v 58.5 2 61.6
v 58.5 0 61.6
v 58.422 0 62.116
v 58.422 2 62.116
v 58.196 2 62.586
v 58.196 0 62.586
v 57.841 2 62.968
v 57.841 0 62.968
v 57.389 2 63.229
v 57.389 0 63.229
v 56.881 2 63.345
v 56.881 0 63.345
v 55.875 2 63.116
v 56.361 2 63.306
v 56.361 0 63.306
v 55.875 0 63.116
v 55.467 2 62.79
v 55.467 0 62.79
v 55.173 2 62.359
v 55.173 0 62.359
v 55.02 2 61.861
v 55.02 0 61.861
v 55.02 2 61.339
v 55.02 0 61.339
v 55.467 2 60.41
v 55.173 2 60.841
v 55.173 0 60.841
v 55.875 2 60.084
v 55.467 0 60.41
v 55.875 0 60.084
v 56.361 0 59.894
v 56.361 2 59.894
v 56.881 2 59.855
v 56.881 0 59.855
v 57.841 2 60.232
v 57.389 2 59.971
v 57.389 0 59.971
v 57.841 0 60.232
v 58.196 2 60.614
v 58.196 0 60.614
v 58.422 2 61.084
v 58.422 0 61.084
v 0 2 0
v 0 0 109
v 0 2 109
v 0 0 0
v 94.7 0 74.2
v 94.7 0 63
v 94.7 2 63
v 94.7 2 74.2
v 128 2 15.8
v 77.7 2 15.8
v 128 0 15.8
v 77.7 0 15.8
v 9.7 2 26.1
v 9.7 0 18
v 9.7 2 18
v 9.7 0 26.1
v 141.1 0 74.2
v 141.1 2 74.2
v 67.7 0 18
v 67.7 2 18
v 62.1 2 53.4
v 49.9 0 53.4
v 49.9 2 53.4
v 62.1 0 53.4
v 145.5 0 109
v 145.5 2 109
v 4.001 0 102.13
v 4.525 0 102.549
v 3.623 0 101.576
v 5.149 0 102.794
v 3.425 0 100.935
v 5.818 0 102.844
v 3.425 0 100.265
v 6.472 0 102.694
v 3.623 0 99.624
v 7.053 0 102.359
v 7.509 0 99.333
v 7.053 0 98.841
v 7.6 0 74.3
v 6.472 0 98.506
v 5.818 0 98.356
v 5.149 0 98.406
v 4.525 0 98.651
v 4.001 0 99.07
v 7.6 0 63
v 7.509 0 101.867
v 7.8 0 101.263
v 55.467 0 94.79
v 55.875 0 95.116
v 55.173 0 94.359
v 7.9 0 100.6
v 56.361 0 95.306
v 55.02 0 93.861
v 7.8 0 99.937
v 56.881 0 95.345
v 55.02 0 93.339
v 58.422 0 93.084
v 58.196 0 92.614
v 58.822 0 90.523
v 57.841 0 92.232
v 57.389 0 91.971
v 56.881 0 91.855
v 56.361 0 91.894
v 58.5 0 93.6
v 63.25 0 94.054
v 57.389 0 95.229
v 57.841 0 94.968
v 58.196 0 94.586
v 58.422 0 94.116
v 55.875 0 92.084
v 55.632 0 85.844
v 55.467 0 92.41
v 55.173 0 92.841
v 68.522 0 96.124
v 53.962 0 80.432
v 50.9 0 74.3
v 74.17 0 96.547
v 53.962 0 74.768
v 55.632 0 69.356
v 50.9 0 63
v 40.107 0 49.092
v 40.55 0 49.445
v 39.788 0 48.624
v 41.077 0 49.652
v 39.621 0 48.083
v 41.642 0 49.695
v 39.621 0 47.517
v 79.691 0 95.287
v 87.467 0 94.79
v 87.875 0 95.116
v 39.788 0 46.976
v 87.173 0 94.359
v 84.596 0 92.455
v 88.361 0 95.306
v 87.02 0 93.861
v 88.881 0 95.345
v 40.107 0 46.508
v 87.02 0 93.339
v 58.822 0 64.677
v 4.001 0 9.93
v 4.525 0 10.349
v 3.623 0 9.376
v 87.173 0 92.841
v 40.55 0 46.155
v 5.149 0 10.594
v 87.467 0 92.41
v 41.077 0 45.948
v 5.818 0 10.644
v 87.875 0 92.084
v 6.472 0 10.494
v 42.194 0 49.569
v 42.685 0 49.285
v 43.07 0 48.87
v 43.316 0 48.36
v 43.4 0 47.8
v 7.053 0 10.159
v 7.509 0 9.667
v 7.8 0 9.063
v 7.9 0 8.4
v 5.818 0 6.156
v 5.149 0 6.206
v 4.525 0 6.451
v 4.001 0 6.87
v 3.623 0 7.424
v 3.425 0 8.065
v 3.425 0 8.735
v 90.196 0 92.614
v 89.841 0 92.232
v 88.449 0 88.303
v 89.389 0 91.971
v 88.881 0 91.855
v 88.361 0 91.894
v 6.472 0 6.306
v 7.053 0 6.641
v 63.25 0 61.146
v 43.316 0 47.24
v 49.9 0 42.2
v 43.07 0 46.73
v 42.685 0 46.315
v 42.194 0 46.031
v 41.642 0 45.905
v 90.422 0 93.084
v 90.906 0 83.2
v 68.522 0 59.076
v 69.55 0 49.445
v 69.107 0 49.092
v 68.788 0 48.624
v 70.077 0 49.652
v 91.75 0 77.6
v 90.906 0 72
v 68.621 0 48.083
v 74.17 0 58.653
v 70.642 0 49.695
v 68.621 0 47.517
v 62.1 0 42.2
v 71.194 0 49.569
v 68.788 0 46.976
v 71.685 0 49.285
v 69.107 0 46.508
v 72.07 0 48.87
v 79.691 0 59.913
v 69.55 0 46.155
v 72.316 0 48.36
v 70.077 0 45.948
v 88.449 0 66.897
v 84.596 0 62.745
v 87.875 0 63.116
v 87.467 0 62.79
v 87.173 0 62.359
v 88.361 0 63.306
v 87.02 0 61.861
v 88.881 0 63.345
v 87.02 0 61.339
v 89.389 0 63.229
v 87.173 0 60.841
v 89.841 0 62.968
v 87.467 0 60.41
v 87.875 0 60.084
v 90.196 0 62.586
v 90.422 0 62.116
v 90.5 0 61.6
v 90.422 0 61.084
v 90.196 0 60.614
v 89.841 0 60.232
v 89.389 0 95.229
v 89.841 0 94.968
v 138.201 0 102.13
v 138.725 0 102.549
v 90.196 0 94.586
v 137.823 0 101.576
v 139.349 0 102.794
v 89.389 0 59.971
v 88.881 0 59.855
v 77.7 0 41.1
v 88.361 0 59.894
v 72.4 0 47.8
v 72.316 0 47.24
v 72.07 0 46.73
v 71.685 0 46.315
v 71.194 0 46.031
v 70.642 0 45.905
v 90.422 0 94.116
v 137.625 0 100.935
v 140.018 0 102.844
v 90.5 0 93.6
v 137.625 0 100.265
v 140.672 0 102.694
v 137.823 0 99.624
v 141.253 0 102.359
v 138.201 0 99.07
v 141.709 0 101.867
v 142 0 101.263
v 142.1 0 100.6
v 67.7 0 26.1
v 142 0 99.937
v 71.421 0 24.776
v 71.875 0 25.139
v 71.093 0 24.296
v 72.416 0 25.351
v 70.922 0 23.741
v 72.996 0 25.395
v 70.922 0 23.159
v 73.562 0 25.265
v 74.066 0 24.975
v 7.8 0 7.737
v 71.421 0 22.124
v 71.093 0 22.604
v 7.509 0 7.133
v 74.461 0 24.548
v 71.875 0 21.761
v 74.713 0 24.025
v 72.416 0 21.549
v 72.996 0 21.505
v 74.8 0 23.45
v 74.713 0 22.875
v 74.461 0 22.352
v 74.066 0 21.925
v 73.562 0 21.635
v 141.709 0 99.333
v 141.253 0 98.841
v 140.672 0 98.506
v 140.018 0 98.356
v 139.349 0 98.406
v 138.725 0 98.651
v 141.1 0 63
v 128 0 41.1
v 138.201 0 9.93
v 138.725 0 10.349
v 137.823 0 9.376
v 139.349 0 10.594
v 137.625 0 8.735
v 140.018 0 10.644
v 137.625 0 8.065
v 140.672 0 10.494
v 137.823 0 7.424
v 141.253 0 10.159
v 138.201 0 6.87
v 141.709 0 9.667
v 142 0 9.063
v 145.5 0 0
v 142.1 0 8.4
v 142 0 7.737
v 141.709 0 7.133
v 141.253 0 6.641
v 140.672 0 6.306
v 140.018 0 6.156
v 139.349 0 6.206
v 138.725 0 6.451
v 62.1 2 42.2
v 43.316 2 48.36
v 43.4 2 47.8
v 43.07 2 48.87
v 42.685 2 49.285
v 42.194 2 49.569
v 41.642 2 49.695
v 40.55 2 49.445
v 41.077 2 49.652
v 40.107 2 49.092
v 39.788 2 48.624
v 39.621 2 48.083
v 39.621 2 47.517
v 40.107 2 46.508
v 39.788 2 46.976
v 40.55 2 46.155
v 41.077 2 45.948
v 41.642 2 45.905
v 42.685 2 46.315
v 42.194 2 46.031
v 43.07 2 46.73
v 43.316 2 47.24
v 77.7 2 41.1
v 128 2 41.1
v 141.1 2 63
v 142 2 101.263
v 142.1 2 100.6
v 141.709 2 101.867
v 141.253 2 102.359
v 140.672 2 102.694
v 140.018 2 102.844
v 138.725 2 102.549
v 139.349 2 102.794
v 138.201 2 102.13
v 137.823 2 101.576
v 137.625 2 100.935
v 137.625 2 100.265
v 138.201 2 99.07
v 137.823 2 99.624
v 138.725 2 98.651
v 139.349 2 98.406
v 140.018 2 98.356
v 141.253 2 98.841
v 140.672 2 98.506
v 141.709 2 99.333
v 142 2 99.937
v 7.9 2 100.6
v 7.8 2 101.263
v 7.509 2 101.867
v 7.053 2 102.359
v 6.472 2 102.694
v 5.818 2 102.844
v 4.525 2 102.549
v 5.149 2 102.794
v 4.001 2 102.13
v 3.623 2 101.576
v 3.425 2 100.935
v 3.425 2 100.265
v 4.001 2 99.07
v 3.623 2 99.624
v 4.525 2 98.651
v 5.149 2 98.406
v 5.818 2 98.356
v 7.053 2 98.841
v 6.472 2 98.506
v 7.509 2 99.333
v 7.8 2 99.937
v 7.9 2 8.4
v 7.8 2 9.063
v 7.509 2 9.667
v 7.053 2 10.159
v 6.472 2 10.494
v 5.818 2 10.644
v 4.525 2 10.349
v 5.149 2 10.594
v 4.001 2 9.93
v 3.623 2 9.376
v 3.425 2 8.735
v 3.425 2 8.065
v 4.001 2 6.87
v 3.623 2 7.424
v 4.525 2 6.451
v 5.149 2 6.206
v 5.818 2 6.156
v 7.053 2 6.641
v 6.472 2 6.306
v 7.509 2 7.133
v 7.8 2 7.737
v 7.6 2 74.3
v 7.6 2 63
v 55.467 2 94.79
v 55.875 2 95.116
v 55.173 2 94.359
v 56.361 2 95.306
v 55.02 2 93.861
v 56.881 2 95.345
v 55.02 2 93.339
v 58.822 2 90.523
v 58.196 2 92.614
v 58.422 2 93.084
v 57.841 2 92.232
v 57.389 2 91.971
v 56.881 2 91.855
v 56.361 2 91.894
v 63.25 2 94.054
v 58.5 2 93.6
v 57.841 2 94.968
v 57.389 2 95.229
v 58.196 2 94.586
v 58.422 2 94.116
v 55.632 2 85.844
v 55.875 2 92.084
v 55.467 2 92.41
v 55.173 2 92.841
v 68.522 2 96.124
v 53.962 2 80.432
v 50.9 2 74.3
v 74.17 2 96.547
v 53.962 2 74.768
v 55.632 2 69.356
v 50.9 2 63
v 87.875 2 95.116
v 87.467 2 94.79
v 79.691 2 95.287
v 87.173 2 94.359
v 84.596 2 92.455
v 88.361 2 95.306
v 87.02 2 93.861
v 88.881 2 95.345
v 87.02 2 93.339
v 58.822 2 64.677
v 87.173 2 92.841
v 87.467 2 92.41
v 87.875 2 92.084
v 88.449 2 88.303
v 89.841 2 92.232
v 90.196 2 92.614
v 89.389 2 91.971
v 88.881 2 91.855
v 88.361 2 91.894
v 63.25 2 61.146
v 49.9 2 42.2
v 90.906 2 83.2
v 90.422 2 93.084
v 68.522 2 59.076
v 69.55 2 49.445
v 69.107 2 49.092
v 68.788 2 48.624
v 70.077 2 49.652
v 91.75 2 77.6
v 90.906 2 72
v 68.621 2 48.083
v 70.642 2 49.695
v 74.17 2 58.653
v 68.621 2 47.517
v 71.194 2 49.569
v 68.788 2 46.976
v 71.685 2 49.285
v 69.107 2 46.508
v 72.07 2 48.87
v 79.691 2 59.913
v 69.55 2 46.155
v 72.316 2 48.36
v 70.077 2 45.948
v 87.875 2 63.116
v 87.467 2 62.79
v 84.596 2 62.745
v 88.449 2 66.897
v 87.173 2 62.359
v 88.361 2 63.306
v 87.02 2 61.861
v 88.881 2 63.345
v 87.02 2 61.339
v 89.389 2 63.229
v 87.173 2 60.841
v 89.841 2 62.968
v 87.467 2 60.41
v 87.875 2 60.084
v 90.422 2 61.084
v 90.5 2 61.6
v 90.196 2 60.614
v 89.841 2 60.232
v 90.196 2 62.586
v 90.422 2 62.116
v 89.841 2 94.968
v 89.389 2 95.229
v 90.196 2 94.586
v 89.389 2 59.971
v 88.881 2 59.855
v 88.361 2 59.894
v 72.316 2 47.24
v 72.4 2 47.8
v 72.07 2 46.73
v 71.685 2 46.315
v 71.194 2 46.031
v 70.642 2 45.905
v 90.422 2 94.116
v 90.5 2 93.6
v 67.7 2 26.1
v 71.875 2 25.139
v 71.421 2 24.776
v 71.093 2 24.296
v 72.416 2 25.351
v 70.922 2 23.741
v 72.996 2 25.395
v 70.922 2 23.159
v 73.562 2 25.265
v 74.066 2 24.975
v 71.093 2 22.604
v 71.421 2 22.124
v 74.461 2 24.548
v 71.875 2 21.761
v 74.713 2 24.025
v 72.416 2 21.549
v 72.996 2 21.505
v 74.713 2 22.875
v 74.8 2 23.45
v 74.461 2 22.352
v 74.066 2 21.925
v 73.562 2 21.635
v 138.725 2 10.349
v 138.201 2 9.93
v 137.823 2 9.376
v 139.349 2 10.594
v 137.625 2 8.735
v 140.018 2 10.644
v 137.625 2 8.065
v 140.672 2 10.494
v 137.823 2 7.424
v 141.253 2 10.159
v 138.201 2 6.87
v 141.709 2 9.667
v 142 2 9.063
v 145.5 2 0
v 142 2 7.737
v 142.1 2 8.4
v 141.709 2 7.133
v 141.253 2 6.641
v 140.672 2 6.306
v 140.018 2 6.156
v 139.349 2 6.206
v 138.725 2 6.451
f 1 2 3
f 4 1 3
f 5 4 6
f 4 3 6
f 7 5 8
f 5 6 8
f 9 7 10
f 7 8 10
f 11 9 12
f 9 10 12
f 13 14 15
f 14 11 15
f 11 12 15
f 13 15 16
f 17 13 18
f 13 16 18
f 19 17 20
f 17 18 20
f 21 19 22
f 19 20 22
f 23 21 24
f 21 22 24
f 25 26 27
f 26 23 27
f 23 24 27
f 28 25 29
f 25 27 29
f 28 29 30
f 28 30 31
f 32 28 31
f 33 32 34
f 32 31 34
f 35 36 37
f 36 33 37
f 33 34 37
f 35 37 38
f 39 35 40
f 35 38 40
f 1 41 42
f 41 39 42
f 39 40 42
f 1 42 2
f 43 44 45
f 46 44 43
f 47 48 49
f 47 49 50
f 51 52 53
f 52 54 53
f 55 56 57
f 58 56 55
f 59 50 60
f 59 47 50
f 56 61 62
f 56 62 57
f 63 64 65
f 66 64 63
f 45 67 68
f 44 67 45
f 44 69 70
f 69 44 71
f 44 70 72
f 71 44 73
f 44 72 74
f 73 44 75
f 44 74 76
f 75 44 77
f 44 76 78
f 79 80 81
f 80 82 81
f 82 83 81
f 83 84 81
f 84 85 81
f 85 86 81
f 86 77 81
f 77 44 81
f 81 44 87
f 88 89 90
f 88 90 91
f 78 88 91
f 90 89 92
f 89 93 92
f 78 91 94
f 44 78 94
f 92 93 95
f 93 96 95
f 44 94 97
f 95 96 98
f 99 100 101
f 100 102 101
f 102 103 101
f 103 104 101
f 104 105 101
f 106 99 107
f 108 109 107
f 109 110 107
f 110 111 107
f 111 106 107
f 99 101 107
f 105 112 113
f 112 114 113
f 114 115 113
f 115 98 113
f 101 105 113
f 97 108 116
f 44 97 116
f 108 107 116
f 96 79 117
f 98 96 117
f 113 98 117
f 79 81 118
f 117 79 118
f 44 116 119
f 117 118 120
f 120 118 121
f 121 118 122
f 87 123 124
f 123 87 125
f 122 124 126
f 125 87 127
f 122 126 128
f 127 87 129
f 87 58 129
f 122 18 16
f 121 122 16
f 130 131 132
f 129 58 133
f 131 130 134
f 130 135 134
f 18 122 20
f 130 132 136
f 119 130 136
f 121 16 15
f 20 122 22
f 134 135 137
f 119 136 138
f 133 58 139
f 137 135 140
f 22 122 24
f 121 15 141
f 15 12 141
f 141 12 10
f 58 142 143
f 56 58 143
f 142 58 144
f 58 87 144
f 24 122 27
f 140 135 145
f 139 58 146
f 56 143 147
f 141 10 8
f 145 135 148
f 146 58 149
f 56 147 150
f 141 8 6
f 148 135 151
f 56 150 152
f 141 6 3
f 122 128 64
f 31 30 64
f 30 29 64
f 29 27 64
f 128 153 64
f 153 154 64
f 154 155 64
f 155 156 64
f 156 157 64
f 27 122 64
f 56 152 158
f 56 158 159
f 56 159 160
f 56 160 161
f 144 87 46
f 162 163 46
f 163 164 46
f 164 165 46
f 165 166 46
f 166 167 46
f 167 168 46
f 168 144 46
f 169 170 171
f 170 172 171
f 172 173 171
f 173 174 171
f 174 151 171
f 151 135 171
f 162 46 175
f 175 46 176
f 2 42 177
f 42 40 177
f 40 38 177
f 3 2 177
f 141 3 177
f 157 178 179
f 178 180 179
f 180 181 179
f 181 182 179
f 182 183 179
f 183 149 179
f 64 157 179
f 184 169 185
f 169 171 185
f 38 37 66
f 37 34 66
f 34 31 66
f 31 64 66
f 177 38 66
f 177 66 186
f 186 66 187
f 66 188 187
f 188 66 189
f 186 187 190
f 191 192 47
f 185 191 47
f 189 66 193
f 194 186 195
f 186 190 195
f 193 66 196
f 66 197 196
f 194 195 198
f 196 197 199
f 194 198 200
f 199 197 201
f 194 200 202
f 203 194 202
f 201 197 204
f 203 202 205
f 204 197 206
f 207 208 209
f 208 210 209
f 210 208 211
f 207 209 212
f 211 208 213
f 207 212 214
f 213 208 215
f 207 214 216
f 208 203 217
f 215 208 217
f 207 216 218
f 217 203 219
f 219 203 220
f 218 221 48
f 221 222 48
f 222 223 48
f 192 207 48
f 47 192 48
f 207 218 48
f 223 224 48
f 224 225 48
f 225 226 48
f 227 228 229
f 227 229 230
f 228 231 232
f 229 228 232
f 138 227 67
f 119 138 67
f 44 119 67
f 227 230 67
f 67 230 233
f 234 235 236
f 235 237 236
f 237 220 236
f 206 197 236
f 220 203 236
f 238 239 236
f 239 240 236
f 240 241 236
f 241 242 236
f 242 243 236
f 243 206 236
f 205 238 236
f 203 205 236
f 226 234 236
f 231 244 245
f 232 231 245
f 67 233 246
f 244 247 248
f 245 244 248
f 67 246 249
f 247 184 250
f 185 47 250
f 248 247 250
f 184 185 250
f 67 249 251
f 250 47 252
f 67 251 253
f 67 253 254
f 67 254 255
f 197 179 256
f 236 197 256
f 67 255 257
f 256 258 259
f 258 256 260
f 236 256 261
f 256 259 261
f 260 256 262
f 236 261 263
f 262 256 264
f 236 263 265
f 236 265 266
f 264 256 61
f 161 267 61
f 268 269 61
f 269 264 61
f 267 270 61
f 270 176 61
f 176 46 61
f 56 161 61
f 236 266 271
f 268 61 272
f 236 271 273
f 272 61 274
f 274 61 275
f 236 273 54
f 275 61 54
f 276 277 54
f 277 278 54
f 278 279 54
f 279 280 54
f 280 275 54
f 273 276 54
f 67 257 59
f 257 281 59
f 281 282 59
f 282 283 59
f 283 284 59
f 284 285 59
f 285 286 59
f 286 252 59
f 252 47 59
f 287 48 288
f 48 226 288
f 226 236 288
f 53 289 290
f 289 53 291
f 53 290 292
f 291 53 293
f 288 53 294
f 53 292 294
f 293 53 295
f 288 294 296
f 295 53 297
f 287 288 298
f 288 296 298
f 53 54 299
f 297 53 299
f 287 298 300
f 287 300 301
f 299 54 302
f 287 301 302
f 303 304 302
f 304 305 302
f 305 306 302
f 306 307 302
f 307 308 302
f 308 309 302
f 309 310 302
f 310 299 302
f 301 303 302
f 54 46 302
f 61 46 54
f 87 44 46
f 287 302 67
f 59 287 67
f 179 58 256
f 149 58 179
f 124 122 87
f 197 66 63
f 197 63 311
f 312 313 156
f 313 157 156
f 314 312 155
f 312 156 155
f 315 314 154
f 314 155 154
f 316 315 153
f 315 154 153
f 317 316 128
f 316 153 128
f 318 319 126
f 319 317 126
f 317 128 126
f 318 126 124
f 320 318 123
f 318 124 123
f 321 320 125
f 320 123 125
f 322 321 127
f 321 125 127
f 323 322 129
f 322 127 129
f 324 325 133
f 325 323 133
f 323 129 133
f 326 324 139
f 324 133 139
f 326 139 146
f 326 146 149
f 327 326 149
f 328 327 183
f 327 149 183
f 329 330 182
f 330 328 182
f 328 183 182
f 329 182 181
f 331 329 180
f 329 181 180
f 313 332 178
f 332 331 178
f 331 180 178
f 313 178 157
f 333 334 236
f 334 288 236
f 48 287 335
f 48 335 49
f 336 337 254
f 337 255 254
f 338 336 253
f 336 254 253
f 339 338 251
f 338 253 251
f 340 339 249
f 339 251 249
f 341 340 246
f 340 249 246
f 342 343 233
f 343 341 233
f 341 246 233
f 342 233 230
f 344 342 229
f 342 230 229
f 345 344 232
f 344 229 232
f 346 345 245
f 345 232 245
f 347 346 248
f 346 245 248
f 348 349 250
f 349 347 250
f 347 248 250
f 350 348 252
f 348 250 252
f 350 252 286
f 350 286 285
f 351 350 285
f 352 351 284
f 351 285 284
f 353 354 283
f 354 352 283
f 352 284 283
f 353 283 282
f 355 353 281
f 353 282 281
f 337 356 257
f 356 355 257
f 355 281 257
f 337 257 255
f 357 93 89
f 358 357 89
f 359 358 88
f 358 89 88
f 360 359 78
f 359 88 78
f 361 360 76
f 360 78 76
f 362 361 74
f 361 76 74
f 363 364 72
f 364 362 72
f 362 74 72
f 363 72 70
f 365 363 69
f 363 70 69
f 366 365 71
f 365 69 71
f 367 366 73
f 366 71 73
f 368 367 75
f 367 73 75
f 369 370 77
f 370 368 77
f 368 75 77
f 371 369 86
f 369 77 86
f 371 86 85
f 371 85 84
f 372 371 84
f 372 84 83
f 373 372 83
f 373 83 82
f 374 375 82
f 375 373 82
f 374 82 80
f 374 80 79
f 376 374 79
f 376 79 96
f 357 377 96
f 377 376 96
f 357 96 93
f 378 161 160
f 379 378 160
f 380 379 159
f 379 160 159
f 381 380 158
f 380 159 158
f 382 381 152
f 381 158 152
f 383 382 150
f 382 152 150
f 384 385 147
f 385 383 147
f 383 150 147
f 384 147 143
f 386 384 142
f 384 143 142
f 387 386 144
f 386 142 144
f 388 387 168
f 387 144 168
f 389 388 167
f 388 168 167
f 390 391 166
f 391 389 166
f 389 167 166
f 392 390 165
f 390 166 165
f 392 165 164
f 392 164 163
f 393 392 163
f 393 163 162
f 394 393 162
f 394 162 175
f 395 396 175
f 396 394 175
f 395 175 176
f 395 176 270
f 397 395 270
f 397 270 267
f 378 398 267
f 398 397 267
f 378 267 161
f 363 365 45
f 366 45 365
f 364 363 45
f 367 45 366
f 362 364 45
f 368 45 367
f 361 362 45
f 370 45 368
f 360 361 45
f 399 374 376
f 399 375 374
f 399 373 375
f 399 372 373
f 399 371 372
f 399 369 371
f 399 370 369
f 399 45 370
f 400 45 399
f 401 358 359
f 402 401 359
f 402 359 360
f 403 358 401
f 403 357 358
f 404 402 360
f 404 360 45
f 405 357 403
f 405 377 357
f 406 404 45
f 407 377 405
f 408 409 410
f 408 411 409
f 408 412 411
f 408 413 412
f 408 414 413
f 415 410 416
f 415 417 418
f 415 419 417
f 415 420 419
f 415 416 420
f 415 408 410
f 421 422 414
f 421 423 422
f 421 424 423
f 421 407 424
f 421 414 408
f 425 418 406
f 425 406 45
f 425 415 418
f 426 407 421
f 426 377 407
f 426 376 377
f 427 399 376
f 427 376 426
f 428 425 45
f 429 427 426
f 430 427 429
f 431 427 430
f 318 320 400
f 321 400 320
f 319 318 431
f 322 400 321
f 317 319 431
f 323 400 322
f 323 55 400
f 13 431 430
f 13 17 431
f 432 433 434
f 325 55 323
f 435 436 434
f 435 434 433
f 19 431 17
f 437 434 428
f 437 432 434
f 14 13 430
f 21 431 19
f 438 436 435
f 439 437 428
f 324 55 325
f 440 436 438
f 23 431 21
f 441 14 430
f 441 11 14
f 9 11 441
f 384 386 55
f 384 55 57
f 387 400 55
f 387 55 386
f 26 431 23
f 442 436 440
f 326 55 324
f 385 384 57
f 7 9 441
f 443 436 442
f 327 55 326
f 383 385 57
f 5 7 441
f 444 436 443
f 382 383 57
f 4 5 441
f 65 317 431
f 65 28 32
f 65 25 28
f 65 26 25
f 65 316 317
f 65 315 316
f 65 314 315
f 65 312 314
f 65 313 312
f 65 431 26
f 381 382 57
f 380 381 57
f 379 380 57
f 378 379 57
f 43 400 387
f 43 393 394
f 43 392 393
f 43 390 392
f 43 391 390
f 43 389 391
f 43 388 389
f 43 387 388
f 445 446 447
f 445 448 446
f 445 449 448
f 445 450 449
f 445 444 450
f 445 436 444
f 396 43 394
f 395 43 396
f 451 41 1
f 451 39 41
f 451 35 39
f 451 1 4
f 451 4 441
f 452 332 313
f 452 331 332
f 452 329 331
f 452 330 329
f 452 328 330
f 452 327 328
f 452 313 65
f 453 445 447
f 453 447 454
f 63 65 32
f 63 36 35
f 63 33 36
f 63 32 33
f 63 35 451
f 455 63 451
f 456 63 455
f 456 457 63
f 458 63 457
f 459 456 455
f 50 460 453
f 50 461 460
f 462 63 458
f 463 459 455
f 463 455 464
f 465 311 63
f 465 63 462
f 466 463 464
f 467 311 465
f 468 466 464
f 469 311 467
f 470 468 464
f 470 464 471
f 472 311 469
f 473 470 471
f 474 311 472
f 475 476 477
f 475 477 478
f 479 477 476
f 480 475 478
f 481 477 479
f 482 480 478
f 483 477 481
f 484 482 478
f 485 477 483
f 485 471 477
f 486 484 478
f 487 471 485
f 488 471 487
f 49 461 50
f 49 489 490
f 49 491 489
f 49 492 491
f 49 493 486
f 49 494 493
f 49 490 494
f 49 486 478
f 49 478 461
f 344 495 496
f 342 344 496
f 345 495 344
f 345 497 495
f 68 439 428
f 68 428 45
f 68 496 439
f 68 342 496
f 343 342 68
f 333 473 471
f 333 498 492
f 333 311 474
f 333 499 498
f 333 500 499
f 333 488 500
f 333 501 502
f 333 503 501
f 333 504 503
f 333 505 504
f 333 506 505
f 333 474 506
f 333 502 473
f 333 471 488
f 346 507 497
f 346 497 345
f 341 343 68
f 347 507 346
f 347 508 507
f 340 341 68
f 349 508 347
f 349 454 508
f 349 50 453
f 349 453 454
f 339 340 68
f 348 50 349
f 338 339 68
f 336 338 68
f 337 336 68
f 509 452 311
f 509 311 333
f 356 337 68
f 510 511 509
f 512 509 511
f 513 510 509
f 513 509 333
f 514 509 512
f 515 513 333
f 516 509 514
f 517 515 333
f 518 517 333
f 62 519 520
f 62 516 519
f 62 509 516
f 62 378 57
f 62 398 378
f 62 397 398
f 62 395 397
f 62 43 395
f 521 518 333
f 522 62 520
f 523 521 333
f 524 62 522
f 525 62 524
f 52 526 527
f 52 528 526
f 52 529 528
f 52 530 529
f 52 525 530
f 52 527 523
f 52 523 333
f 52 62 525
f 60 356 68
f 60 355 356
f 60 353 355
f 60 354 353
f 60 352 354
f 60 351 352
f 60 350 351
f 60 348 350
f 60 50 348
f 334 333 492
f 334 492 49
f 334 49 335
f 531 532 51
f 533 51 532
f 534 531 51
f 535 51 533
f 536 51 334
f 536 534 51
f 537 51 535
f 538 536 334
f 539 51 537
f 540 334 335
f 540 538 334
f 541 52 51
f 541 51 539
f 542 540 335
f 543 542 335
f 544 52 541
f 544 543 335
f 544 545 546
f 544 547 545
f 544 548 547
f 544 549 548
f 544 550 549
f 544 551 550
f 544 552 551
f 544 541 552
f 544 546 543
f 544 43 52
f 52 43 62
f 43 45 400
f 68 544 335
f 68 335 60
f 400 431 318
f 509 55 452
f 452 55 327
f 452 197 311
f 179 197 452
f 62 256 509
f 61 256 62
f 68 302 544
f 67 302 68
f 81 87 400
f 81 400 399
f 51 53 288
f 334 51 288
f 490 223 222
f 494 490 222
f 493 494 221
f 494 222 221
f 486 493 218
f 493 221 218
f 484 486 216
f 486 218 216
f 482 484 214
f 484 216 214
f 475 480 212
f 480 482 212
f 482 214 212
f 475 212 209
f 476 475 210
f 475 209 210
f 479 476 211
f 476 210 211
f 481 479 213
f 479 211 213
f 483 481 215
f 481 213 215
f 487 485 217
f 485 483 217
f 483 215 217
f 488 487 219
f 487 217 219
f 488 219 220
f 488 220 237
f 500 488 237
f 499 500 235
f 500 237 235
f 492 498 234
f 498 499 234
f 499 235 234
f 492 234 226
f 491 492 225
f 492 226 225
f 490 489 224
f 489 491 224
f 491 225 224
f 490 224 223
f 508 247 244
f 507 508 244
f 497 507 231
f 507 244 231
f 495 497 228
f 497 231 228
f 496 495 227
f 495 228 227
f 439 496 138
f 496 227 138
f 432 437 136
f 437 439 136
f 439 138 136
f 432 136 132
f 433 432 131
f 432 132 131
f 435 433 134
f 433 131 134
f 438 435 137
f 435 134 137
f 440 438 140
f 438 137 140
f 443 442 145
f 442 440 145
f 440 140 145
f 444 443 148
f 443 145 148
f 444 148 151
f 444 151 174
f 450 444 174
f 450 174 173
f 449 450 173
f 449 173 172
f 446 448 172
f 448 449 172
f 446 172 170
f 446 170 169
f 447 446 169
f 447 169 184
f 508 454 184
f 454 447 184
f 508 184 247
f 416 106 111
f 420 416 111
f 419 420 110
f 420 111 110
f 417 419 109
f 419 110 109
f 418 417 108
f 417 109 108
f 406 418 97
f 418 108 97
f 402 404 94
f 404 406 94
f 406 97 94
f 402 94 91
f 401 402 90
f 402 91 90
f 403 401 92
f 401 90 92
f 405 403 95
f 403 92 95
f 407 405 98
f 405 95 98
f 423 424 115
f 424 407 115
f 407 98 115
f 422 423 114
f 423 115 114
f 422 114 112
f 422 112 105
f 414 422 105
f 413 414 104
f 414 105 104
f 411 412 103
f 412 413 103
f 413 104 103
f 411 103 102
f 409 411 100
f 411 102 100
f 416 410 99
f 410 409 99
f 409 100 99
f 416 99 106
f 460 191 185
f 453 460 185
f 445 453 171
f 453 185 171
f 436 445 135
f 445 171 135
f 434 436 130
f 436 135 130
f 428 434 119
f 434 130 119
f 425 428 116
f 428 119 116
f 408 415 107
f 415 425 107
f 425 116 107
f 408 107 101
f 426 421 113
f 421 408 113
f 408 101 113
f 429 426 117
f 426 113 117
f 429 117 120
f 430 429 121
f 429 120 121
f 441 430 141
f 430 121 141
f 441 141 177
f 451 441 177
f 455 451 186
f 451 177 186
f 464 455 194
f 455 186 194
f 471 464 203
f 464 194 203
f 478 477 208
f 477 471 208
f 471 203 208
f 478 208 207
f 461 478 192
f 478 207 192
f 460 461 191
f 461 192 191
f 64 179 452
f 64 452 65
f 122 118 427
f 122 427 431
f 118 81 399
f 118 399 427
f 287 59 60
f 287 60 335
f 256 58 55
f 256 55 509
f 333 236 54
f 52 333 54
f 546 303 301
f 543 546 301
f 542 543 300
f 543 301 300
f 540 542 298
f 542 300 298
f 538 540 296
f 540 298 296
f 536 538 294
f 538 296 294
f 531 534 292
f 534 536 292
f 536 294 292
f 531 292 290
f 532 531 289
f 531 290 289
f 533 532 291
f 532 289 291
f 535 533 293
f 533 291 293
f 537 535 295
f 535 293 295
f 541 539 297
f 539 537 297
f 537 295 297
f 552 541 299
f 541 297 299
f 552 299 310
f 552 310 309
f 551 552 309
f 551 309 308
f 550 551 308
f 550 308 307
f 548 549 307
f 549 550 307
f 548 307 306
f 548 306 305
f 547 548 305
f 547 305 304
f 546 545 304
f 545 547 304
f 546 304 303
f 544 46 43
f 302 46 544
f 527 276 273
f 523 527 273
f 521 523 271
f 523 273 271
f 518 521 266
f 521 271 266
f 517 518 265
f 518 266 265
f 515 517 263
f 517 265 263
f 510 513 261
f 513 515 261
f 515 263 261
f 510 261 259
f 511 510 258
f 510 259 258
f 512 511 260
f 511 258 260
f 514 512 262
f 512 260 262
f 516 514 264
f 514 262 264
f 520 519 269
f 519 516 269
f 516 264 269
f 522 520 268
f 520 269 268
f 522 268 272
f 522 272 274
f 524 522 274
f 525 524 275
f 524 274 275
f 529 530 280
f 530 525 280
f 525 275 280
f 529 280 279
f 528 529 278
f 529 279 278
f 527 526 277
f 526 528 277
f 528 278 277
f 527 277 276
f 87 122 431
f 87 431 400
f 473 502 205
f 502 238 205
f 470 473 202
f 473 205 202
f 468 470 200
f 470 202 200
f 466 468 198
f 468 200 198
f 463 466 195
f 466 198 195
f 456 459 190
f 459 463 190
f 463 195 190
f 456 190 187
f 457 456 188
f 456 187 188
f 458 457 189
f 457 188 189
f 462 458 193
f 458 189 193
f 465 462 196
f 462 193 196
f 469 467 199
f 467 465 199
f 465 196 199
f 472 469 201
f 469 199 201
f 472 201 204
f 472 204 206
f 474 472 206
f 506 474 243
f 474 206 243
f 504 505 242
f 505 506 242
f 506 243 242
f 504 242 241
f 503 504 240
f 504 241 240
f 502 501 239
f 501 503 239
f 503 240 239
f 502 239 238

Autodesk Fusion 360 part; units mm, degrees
sketch "Sketch1" plane through (0, 0, 0) normal (0, 1, 0) x (1, 0, 0)
  line L0 (0, 0) -> (145.5, 0)
  line L1 (145.5, 0) -> (145.5, -109)
  line L2 (145.5, -109) -> (0, -109)
  line L3 (0, -109) -> (0, 0)
  line L4 (5.65, -100.6) -> (139.85, -100.6) construction
  line L5 (139.85, -100.6) -> (139.85, -8.4) construction
  line L6 (139.85, -8.4) -> (5.65, -8.4) construction
  line L7 (5.65, -8.4) -> (5.65, -100.6) construction
  circle A0 centre (5.65, -100.6) radius 2.25
  circle A1 centre (139.85, -100.6) radius 2.25
  circle A2 centre (139.85, -8.4) radius 2.25
  circle A3 centre (5.65, -8.4) radius 2.25
  line L8 (72.75, -109) -> (72.75, 0) construction
  line L9 (0, -54.5) -> (145.5, -54.5) construction
  line L10 (77.7, -15.8) -> (128, -15.8)
  line L11 (128, -15.8) -> (128, -41.1)
  line L12 (128, -41.1) -> (77.7, -41.1)
  line L13 (77.7, -41.1) -> (77.7, -15.8)
  line L14 (9.7, -26.1) -> (67.7, -26.1)
  line L15 (67.7, -26.1) -> (67.7, -18)
  line L16 (67.7, -18) -> (9.7, -18)
  line L17 (9.7, -18) -> (9.7, -26.1)
  line L18 (7.6, -74.3) -> (50.9, -74.3)
  line L19 (50.9, -74.3) -> (50.9, -63)
  line L20 (50.9, -63) -> (7.6, -63)
  line L21 (7.6, -63) -> (7.6, -74.3)
  line L22 (94.7, -74.2) -> (141.1, -74.2)
  line L23 (141.1, -74.2) -> (141.1, -63)
  line L24 (141.1, -63) -> (94.7, -63)
  line L25 (94.7, -63) -> (94.7, -74.2)
  circle A4 centre (72.75, -77.6) radius 19
  circle A5 centre (72.85, -23.45) radius 1.95
  line L26 (72.85, -25.4) -> (72.85, -21.5) construction
  line L27 (70.9, -23.45) -> (74.8, -23.45) construction
  line L28 (56.75, -93.6) -> (88.75, -93.6) construction
  line L29 (88.75, -93.6) -> (88.75, -61.6) construction
  line L30 (88.75, -61.6) -> (56.75, -61.6) construction
  line L31 (56.75, -61.6) -> (56.75, -93.6) construction
  line L32 (53.75, -77.6) -> (91.75, -77.6) construction
  circle A6 centre (56.75, -93.6) radius 1.75
  circle A7 centre (88.75, -93.6) radius 1.75
  circle A8 centre (56.75, -61.6) radius 1.75
  circle A9 centre (88.75, -61.6) radius 1.75
  line L33 (41.5, -47.8) -> (70.5, -47.8) construction
  circle A10 centre (70.5, -47.8) radius 1.9
  circle A11 centre (41.5, -47.8) radius 1.9
  line L34 (49.9, -53.4) -> (62.1, -53.4)
  line L35 (62.1, -53.4) -> (62.1, -42.2)
  line L36 (62.1, -42.2) -> (49.9, -42.2)
  line L37 (49.9, -42.2) -> (49.9, -53.4)
  line L38 (56, -53.4) -> (56, -42.2) construction
  point P0 (72.75, -96.6)
  dimension "d1" = 145.5
  dimension "d2" = 109
  dimension "d5" = 134.2
  dimension "d6" = 4.5
  dimension "d7" = 92.2
  dimension "d10" = 50.3
  dimension "d11" = 25.3
  dimension "d12" = 11.2
  dimension "d13" = 46.4
  dimension "d14" = 43.3
  dimension "d15" = 11.3
  dimension "d16" = 8.1
  dimension "d17" = 58
  dimension "d18" = 18
  dimension "d19" = 63
  dimension "d20" = 15.8
  dimension "d21" = 63
  dimension "d22" = 4.4
  dimension "d23" = 17.5
  dimension "d24" = 9.7
  dimension "d25" = 7.6
  dimension "d26" = 25.4
  dimension "d27" = 21.5
  dimension "d28" = 74.8
  dimension "d29" = 38
  dimension "d30" = 12.4
  dimension "d31" = 32
  dimension "d32" = 3.5
  dimension "d33" = 6.7
  dimension "d34" = 29
  dimension "d35" = 3.8
  dimension "d36" = 11.2
  dimension "d37" = 12.2
  dimension "d38" = 56
extrude "Extrude1" add sketch "Sketch1" along normal blind 1.8 contours L0 L1 L2 L3 | L10 L11 L12 L13 | L14 L15 L16 L17 | L18 L19 L20 L21 | L22 L23 L24 L25 | A4 | A5 | A6 | A7 | A8 | A9 | A10 | A11 | L34 L35 L36 L37 makes body 1
extrude "Extrude2" add sketch "Sketch1" along normal blind 2 separate body makes body 2
hidden bodies 1
